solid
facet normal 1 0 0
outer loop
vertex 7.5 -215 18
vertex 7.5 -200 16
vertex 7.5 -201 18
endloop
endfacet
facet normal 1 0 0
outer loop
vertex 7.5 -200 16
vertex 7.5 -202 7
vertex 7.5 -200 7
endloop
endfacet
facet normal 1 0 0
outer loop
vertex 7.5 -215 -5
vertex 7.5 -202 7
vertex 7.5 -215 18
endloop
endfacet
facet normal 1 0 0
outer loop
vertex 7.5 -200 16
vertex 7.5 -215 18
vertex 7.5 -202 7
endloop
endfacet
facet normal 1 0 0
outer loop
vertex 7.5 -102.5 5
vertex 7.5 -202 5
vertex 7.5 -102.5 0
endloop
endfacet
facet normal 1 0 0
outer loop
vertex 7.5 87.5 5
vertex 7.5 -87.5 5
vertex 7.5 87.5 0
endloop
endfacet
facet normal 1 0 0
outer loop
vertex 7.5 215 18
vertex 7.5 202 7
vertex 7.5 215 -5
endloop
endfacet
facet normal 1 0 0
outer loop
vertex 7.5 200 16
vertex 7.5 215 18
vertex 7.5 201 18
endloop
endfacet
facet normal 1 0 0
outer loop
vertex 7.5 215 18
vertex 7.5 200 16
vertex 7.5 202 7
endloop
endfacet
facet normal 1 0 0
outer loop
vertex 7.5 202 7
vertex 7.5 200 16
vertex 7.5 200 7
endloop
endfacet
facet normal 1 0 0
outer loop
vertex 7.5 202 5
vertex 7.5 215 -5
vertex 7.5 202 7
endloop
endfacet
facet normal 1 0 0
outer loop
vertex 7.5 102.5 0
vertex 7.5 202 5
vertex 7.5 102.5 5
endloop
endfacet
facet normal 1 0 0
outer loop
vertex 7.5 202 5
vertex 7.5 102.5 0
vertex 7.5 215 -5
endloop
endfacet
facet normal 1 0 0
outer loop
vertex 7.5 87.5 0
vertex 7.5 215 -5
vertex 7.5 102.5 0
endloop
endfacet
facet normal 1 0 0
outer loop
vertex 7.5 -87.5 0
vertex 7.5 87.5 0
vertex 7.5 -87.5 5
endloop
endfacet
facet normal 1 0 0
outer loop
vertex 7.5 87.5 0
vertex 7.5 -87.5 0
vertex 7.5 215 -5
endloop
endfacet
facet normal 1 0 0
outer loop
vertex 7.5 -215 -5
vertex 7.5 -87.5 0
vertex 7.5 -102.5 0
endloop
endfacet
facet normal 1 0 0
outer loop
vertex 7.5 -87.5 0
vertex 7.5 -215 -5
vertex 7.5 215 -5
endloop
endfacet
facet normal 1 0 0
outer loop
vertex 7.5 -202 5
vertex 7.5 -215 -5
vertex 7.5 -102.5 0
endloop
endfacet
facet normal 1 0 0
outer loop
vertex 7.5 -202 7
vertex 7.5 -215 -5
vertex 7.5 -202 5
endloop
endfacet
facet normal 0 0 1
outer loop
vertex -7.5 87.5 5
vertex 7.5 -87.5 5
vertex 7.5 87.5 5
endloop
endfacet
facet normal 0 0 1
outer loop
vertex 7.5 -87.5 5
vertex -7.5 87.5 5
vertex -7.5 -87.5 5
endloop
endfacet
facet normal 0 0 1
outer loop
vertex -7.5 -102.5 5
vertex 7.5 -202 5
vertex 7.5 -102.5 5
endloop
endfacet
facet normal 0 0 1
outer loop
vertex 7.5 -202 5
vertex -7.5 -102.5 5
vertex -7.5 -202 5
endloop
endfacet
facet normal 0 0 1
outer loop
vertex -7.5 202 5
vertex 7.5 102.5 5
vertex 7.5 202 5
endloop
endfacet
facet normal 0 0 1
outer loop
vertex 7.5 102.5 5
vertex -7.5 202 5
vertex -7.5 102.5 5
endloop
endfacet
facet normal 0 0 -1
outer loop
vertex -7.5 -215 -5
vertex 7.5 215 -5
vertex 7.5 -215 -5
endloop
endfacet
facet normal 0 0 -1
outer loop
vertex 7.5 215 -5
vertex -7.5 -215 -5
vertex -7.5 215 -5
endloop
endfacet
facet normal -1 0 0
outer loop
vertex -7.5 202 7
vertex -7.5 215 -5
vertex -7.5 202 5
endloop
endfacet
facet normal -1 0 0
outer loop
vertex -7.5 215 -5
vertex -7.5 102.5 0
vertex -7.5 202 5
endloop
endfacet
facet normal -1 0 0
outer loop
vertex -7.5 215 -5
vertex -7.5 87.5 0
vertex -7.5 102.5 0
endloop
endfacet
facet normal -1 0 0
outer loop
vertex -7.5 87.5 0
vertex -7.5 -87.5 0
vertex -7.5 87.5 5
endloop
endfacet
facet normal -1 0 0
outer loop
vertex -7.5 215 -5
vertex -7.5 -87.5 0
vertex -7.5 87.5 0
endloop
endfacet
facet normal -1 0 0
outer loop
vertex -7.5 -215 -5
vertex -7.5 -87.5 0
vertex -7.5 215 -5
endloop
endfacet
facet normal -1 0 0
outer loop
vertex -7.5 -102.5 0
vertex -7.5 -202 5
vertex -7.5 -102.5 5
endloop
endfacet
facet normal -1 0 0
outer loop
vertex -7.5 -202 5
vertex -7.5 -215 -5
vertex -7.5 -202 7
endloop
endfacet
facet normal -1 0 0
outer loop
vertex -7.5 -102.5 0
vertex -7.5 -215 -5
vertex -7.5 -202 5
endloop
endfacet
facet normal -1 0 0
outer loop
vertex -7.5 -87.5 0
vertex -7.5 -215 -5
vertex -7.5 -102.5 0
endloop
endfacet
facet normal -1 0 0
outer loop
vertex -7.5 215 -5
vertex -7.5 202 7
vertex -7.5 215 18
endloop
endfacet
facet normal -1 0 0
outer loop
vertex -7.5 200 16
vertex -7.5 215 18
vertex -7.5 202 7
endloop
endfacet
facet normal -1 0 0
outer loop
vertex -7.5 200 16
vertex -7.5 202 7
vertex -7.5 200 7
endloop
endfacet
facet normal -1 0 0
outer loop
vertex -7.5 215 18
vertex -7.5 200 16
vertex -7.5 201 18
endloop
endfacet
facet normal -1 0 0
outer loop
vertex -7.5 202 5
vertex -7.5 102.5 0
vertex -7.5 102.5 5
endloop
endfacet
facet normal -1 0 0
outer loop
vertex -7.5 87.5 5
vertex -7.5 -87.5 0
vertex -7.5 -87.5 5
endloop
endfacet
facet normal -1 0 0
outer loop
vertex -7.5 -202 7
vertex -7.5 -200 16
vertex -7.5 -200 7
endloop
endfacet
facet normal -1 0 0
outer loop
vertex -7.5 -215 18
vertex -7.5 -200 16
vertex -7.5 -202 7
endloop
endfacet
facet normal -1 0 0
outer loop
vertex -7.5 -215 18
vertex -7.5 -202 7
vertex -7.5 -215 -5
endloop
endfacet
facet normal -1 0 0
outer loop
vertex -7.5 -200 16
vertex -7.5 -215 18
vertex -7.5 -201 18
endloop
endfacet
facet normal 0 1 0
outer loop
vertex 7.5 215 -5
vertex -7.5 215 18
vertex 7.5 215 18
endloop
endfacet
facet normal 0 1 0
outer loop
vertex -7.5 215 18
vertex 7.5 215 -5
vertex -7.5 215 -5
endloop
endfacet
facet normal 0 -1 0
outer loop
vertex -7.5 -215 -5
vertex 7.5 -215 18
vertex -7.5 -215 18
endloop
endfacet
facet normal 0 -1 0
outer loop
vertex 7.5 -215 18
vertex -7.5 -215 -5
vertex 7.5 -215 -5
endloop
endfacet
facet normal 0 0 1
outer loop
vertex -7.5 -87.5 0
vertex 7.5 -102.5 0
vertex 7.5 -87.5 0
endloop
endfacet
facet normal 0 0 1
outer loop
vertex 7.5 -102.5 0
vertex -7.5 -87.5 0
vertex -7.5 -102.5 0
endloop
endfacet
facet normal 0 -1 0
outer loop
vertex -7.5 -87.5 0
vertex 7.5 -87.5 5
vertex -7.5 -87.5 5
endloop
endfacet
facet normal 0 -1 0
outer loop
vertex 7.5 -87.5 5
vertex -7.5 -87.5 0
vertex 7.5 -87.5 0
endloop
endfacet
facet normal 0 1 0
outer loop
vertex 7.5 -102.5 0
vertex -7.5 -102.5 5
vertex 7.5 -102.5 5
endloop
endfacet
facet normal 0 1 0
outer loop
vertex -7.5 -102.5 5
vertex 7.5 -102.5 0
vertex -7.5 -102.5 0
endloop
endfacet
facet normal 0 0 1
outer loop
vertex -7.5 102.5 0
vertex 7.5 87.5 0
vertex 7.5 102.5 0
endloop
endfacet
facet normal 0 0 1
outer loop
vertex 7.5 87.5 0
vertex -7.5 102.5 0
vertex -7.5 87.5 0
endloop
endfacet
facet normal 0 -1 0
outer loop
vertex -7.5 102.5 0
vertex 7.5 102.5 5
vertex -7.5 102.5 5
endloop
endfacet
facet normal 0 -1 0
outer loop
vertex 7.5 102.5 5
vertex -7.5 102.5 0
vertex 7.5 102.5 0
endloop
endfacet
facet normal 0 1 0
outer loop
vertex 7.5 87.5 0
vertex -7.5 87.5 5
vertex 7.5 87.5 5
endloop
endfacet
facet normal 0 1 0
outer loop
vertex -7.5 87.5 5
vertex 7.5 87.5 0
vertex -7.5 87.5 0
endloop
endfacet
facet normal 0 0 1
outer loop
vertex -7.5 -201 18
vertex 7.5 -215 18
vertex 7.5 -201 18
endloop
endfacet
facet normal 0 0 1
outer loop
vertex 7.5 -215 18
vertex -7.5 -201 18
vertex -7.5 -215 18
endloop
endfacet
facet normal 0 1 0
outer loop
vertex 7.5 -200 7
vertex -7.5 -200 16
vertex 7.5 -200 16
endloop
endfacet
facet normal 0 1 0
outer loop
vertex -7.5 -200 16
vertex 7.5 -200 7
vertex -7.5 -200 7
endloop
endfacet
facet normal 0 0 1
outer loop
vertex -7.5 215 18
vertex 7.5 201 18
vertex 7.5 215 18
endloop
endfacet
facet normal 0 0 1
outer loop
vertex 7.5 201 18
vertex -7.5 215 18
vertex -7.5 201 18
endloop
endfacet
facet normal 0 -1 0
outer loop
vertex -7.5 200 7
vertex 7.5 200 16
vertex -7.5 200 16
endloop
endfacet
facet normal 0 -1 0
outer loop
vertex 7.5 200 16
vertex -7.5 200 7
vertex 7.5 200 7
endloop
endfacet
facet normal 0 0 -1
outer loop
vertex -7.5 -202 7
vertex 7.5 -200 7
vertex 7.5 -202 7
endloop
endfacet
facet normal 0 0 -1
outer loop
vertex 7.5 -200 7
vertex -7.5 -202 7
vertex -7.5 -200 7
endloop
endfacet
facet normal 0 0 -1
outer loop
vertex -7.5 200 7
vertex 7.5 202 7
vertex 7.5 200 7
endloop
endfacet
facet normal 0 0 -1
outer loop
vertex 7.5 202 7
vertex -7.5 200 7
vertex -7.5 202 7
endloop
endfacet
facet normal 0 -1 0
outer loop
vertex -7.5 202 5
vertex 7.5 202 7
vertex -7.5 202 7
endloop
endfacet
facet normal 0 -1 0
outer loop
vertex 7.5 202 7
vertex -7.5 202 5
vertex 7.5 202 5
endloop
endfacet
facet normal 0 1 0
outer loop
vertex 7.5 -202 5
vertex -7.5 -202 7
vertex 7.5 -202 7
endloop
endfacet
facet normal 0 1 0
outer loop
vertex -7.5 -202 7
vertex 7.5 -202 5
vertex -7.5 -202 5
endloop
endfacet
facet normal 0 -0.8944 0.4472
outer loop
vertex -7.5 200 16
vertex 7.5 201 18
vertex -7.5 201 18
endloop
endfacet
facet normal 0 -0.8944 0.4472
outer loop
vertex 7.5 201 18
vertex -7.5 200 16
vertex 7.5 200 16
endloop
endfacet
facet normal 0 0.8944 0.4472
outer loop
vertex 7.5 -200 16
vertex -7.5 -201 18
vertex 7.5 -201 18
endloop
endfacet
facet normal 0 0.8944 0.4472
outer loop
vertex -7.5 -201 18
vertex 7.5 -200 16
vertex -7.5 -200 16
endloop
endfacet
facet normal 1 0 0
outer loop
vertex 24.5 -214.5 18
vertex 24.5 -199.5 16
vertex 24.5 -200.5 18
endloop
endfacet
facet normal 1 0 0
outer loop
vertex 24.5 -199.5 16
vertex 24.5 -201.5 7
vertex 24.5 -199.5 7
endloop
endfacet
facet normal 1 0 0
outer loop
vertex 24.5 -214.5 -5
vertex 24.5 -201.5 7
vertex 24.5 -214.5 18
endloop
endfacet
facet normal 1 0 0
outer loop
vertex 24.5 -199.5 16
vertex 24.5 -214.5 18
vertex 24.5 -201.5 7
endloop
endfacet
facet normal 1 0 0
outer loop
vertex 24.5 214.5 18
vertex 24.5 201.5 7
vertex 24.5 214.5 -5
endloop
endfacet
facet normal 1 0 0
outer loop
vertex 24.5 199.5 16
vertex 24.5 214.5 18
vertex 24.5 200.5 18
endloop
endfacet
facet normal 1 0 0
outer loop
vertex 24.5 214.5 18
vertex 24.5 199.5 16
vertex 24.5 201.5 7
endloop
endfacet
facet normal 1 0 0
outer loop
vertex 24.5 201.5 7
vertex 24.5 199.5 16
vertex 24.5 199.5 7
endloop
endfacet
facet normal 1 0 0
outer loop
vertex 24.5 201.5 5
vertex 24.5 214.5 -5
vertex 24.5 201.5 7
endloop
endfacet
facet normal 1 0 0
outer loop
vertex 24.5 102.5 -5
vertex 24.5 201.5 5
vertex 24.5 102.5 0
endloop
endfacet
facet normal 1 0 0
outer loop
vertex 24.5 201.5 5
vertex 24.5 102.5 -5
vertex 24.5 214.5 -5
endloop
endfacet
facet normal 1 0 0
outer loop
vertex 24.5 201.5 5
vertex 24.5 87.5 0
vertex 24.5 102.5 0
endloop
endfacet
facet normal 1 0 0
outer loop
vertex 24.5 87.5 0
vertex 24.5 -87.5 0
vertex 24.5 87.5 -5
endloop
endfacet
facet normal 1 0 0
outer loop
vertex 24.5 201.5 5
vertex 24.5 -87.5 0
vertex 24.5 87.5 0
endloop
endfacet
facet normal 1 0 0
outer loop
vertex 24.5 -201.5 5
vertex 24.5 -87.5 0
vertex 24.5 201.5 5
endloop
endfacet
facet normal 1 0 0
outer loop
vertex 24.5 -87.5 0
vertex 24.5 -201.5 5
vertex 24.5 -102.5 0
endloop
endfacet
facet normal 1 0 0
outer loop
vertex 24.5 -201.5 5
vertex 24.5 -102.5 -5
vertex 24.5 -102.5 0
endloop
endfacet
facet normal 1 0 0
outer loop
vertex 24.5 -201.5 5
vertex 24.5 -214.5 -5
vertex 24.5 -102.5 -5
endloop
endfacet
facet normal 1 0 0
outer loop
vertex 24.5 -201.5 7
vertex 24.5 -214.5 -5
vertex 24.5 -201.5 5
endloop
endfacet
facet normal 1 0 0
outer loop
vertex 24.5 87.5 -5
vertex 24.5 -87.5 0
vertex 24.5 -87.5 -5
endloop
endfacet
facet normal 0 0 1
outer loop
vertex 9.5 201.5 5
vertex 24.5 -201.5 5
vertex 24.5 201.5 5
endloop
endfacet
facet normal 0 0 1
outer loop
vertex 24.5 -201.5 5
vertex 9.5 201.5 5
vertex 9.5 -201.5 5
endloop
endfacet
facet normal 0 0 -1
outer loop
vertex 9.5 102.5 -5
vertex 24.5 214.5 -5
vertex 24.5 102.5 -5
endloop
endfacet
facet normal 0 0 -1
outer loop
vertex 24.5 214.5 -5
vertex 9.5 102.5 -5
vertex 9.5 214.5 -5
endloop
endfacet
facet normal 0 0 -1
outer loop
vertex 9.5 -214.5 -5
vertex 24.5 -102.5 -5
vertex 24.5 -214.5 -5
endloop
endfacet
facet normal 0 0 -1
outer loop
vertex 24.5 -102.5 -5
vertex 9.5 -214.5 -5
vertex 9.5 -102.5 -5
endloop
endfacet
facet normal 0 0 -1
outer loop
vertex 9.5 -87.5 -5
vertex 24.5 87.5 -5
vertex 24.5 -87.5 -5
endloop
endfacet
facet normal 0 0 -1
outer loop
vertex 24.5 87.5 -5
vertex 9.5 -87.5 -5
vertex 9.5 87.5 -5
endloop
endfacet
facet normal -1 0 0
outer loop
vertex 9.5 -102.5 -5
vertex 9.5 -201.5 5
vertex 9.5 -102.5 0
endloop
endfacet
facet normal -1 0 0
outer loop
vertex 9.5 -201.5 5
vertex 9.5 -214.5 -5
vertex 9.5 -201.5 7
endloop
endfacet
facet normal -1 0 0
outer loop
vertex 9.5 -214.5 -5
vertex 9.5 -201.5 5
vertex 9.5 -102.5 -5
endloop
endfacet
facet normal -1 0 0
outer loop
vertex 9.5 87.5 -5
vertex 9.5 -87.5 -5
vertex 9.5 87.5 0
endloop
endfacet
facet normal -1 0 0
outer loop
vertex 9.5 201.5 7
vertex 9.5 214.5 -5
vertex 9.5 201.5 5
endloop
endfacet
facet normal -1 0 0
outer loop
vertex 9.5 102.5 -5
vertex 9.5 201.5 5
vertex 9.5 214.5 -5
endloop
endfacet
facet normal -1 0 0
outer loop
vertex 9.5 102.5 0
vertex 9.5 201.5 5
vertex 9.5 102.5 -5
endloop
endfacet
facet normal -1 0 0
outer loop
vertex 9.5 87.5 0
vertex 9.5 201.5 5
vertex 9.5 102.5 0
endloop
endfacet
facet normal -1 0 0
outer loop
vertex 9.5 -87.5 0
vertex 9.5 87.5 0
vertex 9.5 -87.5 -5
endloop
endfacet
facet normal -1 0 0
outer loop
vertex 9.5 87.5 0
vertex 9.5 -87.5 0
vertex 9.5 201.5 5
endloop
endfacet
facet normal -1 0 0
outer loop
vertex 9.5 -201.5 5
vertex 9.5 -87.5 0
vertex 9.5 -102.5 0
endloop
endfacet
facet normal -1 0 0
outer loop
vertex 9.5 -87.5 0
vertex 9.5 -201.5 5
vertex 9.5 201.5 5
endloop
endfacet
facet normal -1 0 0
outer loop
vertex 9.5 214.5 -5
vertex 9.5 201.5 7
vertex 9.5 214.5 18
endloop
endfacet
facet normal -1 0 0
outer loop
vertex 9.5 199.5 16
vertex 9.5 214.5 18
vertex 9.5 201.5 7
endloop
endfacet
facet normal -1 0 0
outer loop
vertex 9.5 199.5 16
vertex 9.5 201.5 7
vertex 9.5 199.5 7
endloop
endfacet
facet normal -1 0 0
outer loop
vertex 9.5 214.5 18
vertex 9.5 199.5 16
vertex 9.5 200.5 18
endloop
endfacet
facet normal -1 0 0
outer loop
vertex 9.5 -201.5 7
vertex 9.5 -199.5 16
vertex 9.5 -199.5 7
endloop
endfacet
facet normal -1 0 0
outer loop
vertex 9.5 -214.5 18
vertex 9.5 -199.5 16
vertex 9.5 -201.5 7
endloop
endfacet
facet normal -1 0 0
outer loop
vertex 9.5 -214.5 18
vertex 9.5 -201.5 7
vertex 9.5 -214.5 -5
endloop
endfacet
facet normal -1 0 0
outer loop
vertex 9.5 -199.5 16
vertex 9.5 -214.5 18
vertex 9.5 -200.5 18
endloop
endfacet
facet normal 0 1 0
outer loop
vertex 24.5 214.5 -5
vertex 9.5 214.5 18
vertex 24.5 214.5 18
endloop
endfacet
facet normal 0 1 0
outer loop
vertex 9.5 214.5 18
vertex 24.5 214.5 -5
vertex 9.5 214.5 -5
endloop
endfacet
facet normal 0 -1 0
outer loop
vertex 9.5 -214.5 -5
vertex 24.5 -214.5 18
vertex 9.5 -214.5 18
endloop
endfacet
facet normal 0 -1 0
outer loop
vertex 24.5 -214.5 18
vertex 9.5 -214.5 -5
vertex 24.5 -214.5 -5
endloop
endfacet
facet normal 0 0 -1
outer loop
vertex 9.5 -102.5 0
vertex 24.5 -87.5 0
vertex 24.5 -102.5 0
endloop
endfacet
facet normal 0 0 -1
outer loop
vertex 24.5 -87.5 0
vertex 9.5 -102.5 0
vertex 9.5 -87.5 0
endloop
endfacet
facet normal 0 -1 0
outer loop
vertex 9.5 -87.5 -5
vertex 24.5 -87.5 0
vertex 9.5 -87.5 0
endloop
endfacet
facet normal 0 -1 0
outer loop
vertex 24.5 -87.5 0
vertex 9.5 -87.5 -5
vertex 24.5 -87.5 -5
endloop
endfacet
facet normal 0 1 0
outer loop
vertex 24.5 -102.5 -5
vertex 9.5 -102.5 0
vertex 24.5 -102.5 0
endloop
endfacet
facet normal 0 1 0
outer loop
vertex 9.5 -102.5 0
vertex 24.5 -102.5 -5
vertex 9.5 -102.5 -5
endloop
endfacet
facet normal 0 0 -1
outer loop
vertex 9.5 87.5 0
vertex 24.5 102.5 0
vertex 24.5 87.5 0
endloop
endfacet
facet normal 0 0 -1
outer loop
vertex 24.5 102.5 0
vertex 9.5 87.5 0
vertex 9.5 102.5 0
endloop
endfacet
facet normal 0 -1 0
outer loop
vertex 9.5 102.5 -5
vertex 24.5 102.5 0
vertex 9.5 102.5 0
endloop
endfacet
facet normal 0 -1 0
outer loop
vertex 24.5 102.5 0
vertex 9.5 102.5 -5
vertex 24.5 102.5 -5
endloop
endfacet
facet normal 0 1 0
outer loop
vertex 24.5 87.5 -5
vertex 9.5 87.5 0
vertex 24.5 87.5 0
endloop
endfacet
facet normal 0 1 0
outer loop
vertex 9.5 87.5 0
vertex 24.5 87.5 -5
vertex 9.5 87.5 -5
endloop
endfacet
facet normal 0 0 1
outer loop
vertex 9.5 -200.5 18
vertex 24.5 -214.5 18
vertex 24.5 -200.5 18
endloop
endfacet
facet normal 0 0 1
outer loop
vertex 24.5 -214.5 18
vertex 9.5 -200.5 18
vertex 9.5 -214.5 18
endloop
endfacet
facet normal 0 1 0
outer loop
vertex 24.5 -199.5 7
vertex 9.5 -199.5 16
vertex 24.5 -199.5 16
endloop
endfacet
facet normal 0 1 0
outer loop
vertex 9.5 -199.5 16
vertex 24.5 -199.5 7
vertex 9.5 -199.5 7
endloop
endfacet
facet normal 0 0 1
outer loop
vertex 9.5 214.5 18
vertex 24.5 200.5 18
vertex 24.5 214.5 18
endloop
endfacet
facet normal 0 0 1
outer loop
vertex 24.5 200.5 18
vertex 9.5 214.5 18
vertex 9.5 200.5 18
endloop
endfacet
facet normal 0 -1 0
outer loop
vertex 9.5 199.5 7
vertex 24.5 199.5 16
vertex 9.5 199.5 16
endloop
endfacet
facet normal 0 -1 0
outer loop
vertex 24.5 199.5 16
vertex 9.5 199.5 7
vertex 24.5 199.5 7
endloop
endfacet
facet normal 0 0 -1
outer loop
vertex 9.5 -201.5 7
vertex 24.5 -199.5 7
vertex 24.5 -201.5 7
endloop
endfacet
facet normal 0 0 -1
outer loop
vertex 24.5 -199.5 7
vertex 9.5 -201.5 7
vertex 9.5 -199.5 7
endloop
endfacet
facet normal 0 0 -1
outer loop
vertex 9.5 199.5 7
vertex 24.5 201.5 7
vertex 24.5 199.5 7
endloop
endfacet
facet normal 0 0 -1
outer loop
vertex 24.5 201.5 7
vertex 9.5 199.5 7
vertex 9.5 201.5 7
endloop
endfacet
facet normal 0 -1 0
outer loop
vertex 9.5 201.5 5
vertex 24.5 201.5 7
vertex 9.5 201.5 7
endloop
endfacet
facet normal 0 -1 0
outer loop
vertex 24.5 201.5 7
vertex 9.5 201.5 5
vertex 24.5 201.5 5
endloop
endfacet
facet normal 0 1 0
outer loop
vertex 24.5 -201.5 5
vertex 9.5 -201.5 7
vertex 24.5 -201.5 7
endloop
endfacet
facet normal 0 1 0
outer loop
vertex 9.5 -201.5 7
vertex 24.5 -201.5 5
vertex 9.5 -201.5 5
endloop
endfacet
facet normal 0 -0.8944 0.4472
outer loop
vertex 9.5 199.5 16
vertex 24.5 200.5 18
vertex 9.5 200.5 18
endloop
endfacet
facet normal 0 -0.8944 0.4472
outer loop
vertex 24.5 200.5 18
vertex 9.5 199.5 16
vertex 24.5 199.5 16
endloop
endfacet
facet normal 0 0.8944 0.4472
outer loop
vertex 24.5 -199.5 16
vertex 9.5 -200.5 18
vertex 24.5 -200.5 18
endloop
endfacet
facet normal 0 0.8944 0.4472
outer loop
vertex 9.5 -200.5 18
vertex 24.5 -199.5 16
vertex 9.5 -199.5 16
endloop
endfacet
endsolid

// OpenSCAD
depth = 400;
width = 399;

thickness = 15;
height = 10;

total_bed_height = 11;
constrained_bed_height = 9;

center_square_size = 175;

heater_pad_gap = 2;

ease_in_width = 1;
ease_in_height = 2;

module bar(bar_length, interface_side)
{
  union()
  {
    difference()
    {
      cube([thickness, bar_length + 2 * thickness, height], center = true);
      
      translate([0, -center_square_size * 0.5 - 0.5 * thickness, height * 0.5 * interface_side])
      cube([2 * thickness, thickness, height], center = true);
      
      translate([0, center_square_size * 0.5 + 0.5 * thickness, height * 0.5 * interface_side])
      cube([2 * thickness, thickness, height], center = true);
    }
    
    difference()
    {
      union()
      {
        translate([0, -bar_length * 0.5 - thickness * 0.5, 0.5 * total_bed_height + 0.5 * ease_in_height])
        cube([thickness, thickness, height + total_bed_height + ease_in_height], center = true);

        translate([0, bar_length * 0.5 + thickness * 0.5, 0.5 * total_bed_height + 0.5 * ease_in_height])
        cube([thickness, thickness, height + total_bed_height + ease_in_height], center = true);
      }
      
      translate([0, 0, 0.5 * height + 0.5 * (total_bed_height - constrained_bed_height)])
      cube([2 * thickness, bar_length + 2 * heater_pad_gap, total_bed_height - constrained_bed_height], center = true);
     
      translate([0, 0, 0.5 * height + total_bed_height])
      multmatrix(
        [[1, 0, 0, -thickness],
         [0, 1, ease_in_width / ease_in_height, -0.5 * bar_length],
         [0, 0, 1, 0],
         [0, 0, 0, 1]])
      {
        cube([2 * thickness, bar_length, ease_in_height]);
      }

      translate([0, 0, 0.5 * height + total_bed_height])
      multmatrix(
        [[1, 0, 0, -thickness],
         [0, 1, -ease_in_width / ease_in_height, -0.5 * bar_length],
         [0, 0, 1, 0],
         [0, 0, 0, 1]])
      {
        cube([2 * thickness, bar_length, ease_in_height]);
      }
    }
  }
}

bar(depth, 1);

translate([thickness + 2, 0, 0])
bar(width, -1);
